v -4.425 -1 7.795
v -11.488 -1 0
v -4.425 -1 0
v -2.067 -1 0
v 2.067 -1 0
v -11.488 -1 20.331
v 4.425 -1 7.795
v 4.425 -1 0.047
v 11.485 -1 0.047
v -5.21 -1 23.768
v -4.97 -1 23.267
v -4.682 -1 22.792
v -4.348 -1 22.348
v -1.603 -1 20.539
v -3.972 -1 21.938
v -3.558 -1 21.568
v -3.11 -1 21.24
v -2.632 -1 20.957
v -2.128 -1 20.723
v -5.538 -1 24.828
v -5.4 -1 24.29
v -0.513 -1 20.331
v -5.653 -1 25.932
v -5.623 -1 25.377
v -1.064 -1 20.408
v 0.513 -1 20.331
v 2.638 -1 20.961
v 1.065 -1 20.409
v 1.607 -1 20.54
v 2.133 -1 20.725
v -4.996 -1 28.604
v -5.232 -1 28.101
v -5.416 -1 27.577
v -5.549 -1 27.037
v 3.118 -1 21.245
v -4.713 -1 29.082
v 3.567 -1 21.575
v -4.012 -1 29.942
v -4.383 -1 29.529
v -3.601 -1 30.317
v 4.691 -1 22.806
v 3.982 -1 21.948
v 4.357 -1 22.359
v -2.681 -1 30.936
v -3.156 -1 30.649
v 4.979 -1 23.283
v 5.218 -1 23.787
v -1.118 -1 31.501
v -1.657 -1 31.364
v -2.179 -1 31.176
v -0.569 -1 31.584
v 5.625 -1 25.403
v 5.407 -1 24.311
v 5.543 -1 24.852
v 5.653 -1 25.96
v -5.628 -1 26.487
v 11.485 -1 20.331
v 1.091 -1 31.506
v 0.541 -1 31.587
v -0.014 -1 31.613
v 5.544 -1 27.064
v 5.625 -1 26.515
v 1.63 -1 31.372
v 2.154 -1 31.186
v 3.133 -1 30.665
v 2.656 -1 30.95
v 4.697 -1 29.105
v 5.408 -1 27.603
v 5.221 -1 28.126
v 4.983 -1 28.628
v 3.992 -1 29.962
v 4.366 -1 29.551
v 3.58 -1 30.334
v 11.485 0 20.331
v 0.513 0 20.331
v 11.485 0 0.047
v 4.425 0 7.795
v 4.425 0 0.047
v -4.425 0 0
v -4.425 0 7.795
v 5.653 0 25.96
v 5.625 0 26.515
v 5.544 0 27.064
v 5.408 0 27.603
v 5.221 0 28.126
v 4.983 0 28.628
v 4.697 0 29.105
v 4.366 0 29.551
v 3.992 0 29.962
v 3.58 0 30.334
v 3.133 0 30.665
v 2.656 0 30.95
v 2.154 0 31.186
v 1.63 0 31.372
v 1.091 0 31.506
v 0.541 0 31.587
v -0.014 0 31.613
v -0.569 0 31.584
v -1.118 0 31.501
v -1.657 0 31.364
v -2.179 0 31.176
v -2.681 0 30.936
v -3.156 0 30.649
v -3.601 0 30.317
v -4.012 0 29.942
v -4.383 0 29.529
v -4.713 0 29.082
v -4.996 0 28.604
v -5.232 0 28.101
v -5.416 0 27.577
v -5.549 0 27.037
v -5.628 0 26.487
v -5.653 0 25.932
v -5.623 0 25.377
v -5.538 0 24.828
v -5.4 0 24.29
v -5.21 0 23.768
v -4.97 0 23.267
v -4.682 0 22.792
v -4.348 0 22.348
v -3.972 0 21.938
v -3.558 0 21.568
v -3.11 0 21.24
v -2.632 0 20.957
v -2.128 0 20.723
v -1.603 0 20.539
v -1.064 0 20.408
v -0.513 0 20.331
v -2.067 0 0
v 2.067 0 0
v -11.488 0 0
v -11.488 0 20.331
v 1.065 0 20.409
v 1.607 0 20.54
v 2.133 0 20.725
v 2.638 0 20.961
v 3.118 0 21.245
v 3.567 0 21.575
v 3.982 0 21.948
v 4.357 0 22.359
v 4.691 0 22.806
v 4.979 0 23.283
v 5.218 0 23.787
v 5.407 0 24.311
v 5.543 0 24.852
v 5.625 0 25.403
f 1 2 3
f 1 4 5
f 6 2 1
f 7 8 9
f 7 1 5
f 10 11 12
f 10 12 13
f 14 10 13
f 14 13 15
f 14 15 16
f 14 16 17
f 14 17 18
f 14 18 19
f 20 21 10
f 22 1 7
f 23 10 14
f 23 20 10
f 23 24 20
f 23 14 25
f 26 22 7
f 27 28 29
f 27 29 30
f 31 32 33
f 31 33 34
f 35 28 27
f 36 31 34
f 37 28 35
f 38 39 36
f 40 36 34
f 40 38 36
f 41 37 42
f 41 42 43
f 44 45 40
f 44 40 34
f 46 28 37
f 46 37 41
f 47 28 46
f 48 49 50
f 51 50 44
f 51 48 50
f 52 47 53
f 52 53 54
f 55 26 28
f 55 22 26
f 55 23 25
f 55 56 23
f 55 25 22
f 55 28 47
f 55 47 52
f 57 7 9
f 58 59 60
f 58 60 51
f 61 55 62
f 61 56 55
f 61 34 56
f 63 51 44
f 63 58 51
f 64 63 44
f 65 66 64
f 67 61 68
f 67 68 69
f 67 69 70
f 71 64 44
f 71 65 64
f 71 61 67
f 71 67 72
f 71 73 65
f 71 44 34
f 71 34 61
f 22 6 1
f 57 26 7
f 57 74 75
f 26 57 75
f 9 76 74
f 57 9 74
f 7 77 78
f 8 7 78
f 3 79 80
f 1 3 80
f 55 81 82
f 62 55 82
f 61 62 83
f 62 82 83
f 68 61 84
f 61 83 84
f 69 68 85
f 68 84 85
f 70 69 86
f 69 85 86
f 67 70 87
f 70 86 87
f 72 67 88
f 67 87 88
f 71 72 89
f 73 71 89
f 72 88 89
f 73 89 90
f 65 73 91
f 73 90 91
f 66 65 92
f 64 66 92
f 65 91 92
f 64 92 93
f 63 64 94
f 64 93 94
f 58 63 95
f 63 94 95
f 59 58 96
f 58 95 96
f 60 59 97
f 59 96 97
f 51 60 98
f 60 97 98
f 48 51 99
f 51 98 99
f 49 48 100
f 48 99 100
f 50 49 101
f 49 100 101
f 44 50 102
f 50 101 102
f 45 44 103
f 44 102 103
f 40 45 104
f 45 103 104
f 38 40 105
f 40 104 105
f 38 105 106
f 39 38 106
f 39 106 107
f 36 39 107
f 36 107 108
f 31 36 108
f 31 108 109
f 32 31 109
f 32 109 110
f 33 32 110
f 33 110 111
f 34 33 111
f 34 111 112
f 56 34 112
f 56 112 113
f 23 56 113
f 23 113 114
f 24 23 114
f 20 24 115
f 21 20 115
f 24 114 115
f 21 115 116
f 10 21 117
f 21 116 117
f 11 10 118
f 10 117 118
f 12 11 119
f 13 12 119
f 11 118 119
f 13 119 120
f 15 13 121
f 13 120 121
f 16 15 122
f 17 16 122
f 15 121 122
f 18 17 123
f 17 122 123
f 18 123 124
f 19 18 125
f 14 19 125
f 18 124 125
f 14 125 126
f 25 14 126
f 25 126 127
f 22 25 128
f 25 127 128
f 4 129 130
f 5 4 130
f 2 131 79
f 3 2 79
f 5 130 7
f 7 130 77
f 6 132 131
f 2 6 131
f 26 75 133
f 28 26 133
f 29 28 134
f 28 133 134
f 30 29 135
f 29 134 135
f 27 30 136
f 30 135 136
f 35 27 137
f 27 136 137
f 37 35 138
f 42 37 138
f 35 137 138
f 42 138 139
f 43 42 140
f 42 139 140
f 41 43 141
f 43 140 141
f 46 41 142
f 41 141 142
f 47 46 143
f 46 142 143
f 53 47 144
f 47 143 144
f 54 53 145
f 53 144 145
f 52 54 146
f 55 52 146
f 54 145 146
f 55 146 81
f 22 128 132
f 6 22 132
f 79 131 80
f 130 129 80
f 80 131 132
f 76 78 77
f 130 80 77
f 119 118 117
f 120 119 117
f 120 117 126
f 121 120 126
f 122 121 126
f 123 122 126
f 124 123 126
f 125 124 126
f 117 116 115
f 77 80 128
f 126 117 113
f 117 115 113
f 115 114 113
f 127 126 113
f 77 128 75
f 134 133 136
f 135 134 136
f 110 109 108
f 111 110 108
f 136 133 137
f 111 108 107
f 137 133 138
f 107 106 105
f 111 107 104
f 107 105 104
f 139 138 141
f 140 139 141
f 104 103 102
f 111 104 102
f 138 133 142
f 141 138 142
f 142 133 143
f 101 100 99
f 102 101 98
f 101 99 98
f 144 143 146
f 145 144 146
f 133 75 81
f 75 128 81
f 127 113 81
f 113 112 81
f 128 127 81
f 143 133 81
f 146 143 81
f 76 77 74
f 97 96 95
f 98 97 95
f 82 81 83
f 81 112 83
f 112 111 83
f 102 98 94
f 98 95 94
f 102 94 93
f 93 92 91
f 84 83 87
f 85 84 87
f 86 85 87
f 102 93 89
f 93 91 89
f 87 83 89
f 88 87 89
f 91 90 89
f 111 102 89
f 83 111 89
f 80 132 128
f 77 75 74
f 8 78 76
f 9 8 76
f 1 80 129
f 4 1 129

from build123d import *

# Parameters (mm, degrees)
F1_DEPTH = 1


with BuildPart() as f1:
    # F0 (on Front) → F1 (new body)
    with BuildSketch(Plane.XZ):
        with BuildLine():
            ThreePointArc((0.5134190636, 20.3306143382), (4.1745945423, 22.1487100844), (5.6526372145, 25.9598867907))
            ThreePointArc((5.6526372145, 25.9598867907), (-3.8111767063, 30.134481333), (-0.5134190636, 20.3306143382))
            Line((-0.5134190636, 20.3306143382), (0.5134190636, 20.3306143382))
        make_face()
        with BuildLine():
            Line((0.5134190636, 20.3306143382), (-0.5134190636, 20.3306143382))
            ThreePointArc((-0.5134190636, 20.3306143382), (0, 20.3072495762), (0.5134190636, 20.3306143382))
        make_face()
        with BuildLine():
            ThreePointArc((0.5134190636, 20.3306143382), (0, 20.3072495762), (-0.5134190636, 20.3306143382))
            Line((-0.5134190636, 20.3306143382), (-11.4882850616, 20.3306143382))
            Line((-11.4882850616, 20.3306143382), (-11.4882850616, 0))
            Line((-11.4882850616, 0), (-4.4247405394, 0))
            Line((-4.4247405394, 0), (-4.4247405394, 7.7945953777))
            Line((-4.4247405394, 7.7945953777), (-2.0671913816, 0))
            Line((-2.0671913816, 0), (2.0671913816, 0))
            Line((2.0671913816, 0), (4.4247405394, 7.7945953777))
            Line((4.4247405394, 7.7945953777), (4.4247405394, 0.0472759202))
            Line((4.4247405394, 0.0472759202), (11.4850704372, 0.0472759202))
            Line((11.4850704372, 0.0472759202), (11.4850704372, 20.3306143382))
            Line((11.4850704372, 20.3306143382), (0.5134190636, 20.3306143382))
        make_face()
    extrude(amount=F1_DEPTH)


solid = f1.part
